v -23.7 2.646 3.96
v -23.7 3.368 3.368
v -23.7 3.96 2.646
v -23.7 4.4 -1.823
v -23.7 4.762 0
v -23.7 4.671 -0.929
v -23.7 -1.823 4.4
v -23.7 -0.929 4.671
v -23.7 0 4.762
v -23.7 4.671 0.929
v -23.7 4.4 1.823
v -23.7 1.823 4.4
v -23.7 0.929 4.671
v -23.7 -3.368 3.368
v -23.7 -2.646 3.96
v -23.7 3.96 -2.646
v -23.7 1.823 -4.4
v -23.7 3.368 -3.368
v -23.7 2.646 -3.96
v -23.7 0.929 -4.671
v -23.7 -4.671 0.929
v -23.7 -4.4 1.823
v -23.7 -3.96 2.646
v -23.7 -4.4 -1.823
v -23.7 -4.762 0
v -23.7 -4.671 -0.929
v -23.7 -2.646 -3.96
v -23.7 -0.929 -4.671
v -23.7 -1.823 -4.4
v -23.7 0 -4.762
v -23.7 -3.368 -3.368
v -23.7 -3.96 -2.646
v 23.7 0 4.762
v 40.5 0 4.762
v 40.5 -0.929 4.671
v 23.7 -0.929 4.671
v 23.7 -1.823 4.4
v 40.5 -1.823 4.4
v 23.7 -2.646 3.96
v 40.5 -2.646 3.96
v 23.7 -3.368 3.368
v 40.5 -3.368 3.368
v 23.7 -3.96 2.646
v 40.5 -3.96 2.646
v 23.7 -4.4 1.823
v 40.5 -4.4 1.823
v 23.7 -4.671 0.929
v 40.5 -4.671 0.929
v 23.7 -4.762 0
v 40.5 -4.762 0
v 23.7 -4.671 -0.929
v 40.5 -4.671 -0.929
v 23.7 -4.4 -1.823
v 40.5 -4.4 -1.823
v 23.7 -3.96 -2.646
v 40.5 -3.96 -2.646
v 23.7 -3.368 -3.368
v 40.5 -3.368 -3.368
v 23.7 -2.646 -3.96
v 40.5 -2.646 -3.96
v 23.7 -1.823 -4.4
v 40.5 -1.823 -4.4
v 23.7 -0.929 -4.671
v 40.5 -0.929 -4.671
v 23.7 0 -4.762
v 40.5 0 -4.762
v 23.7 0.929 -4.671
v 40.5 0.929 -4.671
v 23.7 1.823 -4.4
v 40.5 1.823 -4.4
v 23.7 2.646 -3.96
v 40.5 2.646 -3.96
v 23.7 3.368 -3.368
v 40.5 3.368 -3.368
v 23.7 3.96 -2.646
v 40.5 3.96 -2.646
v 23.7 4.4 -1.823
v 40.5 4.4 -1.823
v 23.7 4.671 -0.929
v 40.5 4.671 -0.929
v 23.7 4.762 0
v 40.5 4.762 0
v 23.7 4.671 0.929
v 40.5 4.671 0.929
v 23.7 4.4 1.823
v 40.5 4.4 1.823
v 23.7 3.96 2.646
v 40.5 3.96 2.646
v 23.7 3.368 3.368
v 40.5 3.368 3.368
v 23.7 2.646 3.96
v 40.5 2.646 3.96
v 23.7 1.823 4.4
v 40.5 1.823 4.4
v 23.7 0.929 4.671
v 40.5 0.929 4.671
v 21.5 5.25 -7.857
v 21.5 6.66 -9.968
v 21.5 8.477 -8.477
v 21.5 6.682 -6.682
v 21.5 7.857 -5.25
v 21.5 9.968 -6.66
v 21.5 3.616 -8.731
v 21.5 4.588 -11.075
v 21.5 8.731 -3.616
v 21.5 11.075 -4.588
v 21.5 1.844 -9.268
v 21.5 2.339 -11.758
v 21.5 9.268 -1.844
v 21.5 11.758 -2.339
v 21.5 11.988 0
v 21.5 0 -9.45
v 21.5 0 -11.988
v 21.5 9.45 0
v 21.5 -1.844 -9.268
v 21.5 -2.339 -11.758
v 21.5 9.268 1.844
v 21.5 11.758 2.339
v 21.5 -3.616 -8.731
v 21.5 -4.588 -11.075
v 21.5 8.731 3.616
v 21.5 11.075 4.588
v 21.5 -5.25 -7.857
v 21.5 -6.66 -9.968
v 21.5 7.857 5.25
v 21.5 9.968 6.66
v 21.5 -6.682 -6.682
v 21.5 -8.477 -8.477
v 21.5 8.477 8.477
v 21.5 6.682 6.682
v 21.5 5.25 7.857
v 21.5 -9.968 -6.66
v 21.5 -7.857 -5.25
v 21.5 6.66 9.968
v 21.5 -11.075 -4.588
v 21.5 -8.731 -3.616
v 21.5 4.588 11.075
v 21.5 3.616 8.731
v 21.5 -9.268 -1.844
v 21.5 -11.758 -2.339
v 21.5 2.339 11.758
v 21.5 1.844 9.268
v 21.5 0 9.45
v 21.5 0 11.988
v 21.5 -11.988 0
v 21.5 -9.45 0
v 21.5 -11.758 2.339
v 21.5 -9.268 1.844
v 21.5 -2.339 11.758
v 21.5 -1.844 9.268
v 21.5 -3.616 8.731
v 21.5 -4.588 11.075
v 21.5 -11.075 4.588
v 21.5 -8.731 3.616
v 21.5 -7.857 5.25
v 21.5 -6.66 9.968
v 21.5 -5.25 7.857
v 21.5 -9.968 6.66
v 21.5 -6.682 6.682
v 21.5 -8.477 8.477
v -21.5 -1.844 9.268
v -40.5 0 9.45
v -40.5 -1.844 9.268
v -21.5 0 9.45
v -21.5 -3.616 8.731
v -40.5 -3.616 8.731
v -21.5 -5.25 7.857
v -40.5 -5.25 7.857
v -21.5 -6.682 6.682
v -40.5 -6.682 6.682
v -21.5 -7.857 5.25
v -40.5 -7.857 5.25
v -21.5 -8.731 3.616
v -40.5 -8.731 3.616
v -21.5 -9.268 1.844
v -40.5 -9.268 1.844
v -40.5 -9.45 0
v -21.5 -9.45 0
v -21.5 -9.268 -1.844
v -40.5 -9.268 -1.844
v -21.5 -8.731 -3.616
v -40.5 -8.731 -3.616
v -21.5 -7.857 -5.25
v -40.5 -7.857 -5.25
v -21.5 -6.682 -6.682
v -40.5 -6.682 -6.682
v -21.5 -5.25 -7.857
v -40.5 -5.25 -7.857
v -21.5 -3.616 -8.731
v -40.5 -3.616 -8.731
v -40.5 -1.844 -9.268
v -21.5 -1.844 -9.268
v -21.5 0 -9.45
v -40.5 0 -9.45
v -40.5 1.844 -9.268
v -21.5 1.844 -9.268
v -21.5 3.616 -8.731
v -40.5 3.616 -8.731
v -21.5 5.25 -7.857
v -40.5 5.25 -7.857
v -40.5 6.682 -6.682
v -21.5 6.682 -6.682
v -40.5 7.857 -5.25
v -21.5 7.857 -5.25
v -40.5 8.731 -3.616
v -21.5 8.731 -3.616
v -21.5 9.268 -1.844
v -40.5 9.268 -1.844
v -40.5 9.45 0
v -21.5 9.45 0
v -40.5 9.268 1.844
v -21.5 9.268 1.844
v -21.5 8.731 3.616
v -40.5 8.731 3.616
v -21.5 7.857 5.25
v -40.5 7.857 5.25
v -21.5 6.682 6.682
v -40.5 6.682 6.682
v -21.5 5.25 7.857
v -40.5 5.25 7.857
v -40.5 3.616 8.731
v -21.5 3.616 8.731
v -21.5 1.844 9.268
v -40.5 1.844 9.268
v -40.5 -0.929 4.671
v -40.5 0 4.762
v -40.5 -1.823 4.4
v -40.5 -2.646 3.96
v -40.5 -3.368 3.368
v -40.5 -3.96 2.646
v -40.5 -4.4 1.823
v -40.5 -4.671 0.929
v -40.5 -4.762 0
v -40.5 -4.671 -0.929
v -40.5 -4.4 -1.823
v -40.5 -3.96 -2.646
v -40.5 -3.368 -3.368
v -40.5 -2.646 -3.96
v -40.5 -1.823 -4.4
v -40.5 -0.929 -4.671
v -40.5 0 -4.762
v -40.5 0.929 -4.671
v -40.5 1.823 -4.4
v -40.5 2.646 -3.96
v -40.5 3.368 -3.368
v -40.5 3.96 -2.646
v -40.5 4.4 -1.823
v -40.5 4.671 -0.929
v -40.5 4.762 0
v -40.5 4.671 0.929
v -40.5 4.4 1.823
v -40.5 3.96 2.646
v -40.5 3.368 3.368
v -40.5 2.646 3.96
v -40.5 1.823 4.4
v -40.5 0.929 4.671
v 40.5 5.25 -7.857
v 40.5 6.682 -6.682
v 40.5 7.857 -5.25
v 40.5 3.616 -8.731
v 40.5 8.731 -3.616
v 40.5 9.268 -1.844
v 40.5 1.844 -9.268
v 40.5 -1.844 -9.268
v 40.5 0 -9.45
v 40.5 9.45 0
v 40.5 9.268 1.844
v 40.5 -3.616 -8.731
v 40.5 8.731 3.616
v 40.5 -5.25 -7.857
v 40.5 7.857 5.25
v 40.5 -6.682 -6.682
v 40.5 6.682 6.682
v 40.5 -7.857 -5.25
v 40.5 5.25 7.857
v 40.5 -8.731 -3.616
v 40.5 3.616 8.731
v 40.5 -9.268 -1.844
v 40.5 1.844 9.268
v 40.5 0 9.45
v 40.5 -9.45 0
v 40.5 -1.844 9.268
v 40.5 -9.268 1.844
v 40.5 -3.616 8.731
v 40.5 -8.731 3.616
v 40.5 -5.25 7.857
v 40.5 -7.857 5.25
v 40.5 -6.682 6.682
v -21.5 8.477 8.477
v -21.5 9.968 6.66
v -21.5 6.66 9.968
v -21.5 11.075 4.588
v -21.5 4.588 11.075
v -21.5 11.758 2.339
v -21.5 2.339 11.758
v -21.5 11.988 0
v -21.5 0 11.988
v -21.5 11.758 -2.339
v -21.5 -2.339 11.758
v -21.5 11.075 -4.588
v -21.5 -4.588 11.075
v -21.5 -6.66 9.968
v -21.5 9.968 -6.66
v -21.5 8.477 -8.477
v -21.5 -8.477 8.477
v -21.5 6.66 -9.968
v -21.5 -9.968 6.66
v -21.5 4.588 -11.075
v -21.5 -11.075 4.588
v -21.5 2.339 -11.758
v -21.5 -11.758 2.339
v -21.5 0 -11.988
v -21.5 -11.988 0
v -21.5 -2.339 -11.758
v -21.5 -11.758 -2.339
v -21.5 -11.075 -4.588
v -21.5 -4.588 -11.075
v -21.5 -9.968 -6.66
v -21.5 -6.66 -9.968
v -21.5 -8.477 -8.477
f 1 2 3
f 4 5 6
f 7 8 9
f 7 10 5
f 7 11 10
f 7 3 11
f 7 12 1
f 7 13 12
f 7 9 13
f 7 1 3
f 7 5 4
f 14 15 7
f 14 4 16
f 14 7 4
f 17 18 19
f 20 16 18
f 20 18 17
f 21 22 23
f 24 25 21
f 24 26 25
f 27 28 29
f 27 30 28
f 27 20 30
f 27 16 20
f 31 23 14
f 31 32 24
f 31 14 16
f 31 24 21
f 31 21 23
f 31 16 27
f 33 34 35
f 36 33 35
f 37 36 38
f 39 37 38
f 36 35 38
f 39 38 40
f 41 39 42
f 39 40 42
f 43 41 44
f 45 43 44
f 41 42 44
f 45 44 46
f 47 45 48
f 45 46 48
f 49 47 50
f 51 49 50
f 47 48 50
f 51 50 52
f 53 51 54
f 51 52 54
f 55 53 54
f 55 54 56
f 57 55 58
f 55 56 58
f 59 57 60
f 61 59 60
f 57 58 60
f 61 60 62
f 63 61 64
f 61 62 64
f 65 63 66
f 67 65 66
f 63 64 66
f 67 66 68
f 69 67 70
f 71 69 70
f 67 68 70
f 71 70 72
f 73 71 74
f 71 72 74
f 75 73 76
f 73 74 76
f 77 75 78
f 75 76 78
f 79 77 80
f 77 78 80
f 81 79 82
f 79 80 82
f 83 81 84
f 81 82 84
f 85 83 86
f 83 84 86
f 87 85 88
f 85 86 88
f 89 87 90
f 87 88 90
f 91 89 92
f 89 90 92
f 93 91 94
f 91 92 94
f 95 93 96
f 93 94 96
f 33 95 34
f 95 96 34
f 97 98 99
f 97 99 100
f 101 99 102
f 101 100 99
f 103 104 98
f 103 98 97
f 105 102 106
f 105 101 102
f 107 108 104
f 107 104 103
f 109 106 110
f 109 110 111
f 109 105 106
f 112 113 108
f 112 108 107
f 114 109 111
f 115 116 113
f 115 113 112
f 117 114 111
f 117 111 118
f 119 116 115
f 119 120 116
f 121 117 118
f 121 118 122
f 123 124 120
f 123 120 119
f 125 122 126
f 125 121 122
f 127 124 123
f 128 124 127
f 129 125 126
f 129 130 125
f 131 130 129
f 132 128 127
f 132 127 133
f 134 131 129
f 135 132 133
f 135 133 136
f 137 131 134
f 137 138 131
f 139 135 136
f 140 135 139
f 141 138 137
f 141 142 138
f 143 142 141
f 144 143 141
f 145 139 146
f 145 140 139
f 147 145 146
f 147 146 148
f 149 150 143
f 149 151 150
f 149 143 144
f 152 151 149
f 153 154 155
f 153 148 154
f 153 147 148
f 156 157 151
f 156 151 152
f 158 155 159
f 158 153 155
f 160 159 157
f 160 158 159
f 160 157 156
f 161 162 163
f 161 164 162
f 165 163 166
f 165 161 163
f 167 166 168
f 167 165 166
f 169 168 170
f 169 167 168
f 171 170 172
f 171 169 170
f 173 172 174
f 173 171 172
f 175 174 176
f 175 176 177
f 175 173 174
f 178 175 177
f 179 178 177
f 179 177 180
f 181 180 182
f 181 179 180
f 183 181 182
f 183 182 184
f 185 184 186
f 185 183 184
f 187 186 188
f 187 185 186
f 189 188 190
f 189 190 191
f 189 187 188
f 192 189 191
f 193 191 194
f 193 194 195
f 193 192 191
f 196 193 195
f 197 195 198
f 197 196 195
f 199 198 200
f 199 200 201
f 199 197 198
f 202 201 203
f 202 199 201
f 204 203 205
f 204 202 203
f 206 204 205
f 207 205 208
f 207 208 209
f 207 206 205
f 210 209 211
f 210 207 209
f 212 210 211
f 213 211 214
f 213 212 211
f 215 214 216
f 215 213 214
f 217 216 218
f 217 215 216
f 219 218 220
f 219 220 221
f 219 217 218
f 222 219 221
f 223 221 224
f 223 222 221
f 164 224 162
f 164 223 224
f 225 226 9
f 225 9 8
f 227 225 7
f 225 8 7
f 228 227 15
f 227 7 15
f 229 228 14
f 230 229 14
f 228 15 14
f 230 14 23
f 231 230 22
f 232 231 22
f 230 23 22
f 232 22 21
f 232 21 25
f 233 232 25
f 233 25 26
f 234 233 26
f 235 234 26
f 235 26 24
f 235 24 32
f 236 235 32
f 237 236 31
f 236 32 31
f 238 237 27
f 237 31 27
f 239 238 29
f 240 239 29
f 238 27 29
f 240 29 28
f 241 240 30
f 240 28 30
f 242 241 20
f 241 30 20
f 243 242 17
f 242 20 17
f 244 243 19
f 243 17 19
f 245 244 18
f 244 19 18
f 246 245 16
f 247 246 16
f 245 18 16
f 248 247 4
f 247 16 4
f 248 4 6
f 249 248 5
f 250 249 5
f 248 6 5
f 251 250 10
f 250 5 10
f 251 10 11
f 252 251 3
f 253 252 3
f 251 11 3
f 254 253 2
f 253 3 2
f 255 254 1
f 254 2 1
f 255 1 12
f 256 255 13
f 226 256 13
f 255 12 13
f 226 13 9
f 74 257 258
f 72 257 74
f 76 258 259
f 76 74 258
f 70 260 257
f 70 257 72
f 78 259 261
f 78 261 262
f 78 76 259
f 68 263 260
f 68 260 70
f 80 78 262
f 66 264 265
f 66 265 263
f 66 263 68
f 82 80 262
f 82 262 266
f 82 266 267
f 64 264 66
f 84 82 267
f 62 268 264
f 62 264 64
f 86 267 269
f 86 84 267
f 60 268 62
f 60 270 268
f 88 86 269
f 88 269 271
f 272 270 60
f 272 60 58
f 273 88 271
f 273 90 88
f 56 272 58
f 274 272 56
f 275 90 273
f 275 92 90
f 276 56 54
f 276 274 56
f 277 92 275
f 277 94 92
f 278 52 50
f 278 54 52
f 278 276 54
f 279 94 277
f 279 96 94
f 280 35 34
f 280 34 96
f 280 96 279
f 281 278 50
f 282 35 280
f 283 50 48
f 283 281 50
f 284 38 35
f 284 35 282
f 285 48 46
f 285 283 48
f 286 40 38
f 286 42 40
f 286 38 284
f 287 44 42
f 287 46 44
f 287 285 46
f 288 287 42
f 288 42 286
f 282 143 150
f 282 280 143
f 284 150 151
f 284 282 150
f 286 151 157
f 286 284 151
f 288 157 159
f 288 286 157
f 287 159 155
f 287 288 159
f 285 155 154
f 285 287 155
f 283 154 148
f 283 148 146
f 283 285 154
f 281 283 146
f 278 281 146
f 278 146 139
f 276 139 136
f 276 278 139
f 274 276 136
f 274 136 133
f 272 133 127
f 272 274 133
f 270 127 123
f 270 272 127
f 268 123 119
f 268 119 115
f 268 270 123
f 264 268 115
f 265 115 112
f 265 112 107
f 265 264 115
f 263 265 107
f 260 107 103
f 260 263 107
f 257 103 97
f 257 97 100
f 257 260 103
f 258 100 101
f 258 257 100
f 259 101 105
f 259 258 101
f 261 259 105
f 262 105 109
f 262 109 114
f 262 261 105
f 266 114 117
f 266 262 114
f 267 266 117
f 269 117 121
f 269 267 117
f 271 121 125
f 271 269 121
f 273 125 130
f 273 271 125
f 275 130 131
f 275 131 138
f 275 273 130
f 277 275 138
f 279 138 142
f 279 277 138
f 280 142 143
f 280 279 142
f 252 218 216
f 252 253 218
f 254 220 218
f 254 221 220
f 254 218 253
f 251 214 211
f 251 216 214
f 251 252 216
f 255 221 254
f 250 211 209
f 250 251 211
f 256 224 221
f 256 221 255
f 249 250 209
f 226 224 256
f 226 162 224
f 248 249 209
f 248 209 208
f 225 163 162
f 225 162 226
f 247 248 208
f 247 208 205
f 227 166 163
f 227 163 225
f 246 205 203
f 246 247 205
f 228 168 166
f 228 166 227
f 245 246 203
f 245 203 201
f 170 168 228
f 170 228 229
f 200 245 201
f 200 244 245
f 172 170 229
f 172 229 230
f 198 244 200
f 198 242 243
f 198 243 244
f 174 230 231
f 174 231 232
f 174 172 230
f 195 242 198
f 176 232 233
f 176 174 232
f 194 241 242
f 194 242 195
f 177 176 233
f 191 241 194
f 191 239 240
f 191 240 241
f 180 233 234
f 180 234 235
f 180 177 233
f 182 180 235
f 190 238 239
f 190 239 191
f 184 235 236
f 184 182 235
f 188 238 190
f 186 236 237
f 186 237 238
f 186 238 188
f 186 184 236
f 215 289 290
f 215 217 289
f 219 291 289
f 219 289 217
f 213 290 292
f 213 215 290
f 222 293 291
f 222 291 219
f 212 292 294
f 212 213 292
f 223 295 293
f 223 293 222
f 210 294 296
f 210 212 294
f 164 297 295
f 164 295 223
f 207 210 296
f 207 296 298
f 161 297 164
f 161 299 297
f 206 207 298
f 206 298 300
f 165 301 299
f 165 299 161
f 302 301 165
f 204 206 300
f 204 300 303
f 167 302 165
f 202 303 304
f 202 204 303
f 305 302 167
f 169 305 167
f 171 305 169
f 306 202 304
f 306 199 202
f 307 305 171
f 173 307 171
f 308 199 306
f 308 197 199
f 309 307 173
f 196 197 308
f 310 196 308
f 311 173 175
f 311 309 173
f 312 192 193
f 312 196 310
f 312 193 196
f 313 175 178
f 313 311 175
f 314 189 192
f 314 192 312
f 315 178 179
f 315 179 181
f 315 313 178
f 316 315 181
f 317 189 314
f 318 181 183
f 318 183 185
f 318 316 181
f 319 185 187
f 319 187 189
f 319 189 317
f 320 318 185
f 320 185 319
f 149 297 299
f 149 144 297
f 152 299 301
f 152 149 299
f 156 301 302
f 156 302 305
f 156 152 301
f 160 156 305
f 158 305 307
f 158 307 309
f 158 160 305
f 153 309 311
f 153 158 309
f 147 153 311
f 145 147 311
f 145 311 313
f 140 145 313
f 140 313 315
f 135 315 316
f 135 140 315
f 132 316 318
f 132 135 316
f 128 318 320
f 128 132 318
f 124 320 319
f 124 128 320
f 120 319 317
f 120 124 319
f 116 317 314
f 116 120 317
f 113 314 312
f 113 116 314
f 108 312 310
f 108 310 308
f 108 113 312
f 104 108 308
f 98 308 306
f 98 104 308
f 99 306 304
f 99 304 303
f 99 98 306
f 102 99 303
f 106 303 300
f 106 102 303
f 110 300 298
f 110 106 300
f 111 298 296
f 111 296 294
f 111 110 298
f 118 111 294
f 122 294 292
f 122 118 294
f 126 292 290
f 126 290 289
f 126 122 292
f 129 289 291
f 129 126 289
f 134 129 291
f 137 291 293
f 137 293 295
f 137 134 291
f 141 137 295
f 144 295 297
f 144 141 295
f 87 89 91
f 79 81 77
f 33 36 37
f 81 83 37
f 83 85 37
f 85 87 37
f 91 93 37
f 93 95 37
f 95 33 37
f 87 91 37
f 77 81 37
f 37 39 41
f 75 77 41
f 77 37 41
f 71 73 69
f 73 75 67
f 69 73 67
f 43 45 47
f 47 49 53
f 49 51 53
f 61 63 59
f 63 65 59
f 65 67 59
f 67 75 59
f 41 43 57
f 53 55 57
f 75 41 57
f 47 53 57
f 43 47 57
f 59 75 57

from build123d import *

# Parameters (mm, degrees)
SOCKET_1_SKETCH_W = 17.8
SOCKET_1_SKETCH_H = 4.7625
SOCKET_2_SKETCH_W = 17.8
SOCKET_2_SKETCH_H = 4.7625


with BuildPart() as part:
    # Filter_F2_T6 Sketch → Filter_F2_T6 (revolve)
    with BuildSketch(Plane.XY):
        Polygon((-40.5, 0), (-40.5, 9.45), (-21.5, 9.45), (-21.5, 11.988), (21.5, 11.988), (21.5, 9.45), (40.5, 9.45), (40.5, 0), align=None)
    revolve(axis=Axis((-1000, 0, 0), (1, 0, 0)))

    # Socket 1 Sketch → Socket 1 (revolve, cut)
    with BuildSketch(Plane.XY):
        with Locations((-32.6, 2.38125)):
            Rectangle(SOCKET_1_SKETCH_W, SOCKET_1_SKETCH_H)
    revolve(axis=Axis((-1000, 0, 0), (1, 0, 0)), mode=Mode.SUBTRACT)

    # Socket 2 Sketch → Socket 2 (revolve, cut)
    with BuildSketch(Plane.XY):
        with Locations((32.6, 2.38125)):
            Rectangle(SOCKET_2_SKETCH_W, SOCKET_2_SKETCH_H)
    revolve(axis=Axis((-1000, 0, 0), (1, 0, 0)), mode=Mode.SUBTRACT)


solid = part.part
